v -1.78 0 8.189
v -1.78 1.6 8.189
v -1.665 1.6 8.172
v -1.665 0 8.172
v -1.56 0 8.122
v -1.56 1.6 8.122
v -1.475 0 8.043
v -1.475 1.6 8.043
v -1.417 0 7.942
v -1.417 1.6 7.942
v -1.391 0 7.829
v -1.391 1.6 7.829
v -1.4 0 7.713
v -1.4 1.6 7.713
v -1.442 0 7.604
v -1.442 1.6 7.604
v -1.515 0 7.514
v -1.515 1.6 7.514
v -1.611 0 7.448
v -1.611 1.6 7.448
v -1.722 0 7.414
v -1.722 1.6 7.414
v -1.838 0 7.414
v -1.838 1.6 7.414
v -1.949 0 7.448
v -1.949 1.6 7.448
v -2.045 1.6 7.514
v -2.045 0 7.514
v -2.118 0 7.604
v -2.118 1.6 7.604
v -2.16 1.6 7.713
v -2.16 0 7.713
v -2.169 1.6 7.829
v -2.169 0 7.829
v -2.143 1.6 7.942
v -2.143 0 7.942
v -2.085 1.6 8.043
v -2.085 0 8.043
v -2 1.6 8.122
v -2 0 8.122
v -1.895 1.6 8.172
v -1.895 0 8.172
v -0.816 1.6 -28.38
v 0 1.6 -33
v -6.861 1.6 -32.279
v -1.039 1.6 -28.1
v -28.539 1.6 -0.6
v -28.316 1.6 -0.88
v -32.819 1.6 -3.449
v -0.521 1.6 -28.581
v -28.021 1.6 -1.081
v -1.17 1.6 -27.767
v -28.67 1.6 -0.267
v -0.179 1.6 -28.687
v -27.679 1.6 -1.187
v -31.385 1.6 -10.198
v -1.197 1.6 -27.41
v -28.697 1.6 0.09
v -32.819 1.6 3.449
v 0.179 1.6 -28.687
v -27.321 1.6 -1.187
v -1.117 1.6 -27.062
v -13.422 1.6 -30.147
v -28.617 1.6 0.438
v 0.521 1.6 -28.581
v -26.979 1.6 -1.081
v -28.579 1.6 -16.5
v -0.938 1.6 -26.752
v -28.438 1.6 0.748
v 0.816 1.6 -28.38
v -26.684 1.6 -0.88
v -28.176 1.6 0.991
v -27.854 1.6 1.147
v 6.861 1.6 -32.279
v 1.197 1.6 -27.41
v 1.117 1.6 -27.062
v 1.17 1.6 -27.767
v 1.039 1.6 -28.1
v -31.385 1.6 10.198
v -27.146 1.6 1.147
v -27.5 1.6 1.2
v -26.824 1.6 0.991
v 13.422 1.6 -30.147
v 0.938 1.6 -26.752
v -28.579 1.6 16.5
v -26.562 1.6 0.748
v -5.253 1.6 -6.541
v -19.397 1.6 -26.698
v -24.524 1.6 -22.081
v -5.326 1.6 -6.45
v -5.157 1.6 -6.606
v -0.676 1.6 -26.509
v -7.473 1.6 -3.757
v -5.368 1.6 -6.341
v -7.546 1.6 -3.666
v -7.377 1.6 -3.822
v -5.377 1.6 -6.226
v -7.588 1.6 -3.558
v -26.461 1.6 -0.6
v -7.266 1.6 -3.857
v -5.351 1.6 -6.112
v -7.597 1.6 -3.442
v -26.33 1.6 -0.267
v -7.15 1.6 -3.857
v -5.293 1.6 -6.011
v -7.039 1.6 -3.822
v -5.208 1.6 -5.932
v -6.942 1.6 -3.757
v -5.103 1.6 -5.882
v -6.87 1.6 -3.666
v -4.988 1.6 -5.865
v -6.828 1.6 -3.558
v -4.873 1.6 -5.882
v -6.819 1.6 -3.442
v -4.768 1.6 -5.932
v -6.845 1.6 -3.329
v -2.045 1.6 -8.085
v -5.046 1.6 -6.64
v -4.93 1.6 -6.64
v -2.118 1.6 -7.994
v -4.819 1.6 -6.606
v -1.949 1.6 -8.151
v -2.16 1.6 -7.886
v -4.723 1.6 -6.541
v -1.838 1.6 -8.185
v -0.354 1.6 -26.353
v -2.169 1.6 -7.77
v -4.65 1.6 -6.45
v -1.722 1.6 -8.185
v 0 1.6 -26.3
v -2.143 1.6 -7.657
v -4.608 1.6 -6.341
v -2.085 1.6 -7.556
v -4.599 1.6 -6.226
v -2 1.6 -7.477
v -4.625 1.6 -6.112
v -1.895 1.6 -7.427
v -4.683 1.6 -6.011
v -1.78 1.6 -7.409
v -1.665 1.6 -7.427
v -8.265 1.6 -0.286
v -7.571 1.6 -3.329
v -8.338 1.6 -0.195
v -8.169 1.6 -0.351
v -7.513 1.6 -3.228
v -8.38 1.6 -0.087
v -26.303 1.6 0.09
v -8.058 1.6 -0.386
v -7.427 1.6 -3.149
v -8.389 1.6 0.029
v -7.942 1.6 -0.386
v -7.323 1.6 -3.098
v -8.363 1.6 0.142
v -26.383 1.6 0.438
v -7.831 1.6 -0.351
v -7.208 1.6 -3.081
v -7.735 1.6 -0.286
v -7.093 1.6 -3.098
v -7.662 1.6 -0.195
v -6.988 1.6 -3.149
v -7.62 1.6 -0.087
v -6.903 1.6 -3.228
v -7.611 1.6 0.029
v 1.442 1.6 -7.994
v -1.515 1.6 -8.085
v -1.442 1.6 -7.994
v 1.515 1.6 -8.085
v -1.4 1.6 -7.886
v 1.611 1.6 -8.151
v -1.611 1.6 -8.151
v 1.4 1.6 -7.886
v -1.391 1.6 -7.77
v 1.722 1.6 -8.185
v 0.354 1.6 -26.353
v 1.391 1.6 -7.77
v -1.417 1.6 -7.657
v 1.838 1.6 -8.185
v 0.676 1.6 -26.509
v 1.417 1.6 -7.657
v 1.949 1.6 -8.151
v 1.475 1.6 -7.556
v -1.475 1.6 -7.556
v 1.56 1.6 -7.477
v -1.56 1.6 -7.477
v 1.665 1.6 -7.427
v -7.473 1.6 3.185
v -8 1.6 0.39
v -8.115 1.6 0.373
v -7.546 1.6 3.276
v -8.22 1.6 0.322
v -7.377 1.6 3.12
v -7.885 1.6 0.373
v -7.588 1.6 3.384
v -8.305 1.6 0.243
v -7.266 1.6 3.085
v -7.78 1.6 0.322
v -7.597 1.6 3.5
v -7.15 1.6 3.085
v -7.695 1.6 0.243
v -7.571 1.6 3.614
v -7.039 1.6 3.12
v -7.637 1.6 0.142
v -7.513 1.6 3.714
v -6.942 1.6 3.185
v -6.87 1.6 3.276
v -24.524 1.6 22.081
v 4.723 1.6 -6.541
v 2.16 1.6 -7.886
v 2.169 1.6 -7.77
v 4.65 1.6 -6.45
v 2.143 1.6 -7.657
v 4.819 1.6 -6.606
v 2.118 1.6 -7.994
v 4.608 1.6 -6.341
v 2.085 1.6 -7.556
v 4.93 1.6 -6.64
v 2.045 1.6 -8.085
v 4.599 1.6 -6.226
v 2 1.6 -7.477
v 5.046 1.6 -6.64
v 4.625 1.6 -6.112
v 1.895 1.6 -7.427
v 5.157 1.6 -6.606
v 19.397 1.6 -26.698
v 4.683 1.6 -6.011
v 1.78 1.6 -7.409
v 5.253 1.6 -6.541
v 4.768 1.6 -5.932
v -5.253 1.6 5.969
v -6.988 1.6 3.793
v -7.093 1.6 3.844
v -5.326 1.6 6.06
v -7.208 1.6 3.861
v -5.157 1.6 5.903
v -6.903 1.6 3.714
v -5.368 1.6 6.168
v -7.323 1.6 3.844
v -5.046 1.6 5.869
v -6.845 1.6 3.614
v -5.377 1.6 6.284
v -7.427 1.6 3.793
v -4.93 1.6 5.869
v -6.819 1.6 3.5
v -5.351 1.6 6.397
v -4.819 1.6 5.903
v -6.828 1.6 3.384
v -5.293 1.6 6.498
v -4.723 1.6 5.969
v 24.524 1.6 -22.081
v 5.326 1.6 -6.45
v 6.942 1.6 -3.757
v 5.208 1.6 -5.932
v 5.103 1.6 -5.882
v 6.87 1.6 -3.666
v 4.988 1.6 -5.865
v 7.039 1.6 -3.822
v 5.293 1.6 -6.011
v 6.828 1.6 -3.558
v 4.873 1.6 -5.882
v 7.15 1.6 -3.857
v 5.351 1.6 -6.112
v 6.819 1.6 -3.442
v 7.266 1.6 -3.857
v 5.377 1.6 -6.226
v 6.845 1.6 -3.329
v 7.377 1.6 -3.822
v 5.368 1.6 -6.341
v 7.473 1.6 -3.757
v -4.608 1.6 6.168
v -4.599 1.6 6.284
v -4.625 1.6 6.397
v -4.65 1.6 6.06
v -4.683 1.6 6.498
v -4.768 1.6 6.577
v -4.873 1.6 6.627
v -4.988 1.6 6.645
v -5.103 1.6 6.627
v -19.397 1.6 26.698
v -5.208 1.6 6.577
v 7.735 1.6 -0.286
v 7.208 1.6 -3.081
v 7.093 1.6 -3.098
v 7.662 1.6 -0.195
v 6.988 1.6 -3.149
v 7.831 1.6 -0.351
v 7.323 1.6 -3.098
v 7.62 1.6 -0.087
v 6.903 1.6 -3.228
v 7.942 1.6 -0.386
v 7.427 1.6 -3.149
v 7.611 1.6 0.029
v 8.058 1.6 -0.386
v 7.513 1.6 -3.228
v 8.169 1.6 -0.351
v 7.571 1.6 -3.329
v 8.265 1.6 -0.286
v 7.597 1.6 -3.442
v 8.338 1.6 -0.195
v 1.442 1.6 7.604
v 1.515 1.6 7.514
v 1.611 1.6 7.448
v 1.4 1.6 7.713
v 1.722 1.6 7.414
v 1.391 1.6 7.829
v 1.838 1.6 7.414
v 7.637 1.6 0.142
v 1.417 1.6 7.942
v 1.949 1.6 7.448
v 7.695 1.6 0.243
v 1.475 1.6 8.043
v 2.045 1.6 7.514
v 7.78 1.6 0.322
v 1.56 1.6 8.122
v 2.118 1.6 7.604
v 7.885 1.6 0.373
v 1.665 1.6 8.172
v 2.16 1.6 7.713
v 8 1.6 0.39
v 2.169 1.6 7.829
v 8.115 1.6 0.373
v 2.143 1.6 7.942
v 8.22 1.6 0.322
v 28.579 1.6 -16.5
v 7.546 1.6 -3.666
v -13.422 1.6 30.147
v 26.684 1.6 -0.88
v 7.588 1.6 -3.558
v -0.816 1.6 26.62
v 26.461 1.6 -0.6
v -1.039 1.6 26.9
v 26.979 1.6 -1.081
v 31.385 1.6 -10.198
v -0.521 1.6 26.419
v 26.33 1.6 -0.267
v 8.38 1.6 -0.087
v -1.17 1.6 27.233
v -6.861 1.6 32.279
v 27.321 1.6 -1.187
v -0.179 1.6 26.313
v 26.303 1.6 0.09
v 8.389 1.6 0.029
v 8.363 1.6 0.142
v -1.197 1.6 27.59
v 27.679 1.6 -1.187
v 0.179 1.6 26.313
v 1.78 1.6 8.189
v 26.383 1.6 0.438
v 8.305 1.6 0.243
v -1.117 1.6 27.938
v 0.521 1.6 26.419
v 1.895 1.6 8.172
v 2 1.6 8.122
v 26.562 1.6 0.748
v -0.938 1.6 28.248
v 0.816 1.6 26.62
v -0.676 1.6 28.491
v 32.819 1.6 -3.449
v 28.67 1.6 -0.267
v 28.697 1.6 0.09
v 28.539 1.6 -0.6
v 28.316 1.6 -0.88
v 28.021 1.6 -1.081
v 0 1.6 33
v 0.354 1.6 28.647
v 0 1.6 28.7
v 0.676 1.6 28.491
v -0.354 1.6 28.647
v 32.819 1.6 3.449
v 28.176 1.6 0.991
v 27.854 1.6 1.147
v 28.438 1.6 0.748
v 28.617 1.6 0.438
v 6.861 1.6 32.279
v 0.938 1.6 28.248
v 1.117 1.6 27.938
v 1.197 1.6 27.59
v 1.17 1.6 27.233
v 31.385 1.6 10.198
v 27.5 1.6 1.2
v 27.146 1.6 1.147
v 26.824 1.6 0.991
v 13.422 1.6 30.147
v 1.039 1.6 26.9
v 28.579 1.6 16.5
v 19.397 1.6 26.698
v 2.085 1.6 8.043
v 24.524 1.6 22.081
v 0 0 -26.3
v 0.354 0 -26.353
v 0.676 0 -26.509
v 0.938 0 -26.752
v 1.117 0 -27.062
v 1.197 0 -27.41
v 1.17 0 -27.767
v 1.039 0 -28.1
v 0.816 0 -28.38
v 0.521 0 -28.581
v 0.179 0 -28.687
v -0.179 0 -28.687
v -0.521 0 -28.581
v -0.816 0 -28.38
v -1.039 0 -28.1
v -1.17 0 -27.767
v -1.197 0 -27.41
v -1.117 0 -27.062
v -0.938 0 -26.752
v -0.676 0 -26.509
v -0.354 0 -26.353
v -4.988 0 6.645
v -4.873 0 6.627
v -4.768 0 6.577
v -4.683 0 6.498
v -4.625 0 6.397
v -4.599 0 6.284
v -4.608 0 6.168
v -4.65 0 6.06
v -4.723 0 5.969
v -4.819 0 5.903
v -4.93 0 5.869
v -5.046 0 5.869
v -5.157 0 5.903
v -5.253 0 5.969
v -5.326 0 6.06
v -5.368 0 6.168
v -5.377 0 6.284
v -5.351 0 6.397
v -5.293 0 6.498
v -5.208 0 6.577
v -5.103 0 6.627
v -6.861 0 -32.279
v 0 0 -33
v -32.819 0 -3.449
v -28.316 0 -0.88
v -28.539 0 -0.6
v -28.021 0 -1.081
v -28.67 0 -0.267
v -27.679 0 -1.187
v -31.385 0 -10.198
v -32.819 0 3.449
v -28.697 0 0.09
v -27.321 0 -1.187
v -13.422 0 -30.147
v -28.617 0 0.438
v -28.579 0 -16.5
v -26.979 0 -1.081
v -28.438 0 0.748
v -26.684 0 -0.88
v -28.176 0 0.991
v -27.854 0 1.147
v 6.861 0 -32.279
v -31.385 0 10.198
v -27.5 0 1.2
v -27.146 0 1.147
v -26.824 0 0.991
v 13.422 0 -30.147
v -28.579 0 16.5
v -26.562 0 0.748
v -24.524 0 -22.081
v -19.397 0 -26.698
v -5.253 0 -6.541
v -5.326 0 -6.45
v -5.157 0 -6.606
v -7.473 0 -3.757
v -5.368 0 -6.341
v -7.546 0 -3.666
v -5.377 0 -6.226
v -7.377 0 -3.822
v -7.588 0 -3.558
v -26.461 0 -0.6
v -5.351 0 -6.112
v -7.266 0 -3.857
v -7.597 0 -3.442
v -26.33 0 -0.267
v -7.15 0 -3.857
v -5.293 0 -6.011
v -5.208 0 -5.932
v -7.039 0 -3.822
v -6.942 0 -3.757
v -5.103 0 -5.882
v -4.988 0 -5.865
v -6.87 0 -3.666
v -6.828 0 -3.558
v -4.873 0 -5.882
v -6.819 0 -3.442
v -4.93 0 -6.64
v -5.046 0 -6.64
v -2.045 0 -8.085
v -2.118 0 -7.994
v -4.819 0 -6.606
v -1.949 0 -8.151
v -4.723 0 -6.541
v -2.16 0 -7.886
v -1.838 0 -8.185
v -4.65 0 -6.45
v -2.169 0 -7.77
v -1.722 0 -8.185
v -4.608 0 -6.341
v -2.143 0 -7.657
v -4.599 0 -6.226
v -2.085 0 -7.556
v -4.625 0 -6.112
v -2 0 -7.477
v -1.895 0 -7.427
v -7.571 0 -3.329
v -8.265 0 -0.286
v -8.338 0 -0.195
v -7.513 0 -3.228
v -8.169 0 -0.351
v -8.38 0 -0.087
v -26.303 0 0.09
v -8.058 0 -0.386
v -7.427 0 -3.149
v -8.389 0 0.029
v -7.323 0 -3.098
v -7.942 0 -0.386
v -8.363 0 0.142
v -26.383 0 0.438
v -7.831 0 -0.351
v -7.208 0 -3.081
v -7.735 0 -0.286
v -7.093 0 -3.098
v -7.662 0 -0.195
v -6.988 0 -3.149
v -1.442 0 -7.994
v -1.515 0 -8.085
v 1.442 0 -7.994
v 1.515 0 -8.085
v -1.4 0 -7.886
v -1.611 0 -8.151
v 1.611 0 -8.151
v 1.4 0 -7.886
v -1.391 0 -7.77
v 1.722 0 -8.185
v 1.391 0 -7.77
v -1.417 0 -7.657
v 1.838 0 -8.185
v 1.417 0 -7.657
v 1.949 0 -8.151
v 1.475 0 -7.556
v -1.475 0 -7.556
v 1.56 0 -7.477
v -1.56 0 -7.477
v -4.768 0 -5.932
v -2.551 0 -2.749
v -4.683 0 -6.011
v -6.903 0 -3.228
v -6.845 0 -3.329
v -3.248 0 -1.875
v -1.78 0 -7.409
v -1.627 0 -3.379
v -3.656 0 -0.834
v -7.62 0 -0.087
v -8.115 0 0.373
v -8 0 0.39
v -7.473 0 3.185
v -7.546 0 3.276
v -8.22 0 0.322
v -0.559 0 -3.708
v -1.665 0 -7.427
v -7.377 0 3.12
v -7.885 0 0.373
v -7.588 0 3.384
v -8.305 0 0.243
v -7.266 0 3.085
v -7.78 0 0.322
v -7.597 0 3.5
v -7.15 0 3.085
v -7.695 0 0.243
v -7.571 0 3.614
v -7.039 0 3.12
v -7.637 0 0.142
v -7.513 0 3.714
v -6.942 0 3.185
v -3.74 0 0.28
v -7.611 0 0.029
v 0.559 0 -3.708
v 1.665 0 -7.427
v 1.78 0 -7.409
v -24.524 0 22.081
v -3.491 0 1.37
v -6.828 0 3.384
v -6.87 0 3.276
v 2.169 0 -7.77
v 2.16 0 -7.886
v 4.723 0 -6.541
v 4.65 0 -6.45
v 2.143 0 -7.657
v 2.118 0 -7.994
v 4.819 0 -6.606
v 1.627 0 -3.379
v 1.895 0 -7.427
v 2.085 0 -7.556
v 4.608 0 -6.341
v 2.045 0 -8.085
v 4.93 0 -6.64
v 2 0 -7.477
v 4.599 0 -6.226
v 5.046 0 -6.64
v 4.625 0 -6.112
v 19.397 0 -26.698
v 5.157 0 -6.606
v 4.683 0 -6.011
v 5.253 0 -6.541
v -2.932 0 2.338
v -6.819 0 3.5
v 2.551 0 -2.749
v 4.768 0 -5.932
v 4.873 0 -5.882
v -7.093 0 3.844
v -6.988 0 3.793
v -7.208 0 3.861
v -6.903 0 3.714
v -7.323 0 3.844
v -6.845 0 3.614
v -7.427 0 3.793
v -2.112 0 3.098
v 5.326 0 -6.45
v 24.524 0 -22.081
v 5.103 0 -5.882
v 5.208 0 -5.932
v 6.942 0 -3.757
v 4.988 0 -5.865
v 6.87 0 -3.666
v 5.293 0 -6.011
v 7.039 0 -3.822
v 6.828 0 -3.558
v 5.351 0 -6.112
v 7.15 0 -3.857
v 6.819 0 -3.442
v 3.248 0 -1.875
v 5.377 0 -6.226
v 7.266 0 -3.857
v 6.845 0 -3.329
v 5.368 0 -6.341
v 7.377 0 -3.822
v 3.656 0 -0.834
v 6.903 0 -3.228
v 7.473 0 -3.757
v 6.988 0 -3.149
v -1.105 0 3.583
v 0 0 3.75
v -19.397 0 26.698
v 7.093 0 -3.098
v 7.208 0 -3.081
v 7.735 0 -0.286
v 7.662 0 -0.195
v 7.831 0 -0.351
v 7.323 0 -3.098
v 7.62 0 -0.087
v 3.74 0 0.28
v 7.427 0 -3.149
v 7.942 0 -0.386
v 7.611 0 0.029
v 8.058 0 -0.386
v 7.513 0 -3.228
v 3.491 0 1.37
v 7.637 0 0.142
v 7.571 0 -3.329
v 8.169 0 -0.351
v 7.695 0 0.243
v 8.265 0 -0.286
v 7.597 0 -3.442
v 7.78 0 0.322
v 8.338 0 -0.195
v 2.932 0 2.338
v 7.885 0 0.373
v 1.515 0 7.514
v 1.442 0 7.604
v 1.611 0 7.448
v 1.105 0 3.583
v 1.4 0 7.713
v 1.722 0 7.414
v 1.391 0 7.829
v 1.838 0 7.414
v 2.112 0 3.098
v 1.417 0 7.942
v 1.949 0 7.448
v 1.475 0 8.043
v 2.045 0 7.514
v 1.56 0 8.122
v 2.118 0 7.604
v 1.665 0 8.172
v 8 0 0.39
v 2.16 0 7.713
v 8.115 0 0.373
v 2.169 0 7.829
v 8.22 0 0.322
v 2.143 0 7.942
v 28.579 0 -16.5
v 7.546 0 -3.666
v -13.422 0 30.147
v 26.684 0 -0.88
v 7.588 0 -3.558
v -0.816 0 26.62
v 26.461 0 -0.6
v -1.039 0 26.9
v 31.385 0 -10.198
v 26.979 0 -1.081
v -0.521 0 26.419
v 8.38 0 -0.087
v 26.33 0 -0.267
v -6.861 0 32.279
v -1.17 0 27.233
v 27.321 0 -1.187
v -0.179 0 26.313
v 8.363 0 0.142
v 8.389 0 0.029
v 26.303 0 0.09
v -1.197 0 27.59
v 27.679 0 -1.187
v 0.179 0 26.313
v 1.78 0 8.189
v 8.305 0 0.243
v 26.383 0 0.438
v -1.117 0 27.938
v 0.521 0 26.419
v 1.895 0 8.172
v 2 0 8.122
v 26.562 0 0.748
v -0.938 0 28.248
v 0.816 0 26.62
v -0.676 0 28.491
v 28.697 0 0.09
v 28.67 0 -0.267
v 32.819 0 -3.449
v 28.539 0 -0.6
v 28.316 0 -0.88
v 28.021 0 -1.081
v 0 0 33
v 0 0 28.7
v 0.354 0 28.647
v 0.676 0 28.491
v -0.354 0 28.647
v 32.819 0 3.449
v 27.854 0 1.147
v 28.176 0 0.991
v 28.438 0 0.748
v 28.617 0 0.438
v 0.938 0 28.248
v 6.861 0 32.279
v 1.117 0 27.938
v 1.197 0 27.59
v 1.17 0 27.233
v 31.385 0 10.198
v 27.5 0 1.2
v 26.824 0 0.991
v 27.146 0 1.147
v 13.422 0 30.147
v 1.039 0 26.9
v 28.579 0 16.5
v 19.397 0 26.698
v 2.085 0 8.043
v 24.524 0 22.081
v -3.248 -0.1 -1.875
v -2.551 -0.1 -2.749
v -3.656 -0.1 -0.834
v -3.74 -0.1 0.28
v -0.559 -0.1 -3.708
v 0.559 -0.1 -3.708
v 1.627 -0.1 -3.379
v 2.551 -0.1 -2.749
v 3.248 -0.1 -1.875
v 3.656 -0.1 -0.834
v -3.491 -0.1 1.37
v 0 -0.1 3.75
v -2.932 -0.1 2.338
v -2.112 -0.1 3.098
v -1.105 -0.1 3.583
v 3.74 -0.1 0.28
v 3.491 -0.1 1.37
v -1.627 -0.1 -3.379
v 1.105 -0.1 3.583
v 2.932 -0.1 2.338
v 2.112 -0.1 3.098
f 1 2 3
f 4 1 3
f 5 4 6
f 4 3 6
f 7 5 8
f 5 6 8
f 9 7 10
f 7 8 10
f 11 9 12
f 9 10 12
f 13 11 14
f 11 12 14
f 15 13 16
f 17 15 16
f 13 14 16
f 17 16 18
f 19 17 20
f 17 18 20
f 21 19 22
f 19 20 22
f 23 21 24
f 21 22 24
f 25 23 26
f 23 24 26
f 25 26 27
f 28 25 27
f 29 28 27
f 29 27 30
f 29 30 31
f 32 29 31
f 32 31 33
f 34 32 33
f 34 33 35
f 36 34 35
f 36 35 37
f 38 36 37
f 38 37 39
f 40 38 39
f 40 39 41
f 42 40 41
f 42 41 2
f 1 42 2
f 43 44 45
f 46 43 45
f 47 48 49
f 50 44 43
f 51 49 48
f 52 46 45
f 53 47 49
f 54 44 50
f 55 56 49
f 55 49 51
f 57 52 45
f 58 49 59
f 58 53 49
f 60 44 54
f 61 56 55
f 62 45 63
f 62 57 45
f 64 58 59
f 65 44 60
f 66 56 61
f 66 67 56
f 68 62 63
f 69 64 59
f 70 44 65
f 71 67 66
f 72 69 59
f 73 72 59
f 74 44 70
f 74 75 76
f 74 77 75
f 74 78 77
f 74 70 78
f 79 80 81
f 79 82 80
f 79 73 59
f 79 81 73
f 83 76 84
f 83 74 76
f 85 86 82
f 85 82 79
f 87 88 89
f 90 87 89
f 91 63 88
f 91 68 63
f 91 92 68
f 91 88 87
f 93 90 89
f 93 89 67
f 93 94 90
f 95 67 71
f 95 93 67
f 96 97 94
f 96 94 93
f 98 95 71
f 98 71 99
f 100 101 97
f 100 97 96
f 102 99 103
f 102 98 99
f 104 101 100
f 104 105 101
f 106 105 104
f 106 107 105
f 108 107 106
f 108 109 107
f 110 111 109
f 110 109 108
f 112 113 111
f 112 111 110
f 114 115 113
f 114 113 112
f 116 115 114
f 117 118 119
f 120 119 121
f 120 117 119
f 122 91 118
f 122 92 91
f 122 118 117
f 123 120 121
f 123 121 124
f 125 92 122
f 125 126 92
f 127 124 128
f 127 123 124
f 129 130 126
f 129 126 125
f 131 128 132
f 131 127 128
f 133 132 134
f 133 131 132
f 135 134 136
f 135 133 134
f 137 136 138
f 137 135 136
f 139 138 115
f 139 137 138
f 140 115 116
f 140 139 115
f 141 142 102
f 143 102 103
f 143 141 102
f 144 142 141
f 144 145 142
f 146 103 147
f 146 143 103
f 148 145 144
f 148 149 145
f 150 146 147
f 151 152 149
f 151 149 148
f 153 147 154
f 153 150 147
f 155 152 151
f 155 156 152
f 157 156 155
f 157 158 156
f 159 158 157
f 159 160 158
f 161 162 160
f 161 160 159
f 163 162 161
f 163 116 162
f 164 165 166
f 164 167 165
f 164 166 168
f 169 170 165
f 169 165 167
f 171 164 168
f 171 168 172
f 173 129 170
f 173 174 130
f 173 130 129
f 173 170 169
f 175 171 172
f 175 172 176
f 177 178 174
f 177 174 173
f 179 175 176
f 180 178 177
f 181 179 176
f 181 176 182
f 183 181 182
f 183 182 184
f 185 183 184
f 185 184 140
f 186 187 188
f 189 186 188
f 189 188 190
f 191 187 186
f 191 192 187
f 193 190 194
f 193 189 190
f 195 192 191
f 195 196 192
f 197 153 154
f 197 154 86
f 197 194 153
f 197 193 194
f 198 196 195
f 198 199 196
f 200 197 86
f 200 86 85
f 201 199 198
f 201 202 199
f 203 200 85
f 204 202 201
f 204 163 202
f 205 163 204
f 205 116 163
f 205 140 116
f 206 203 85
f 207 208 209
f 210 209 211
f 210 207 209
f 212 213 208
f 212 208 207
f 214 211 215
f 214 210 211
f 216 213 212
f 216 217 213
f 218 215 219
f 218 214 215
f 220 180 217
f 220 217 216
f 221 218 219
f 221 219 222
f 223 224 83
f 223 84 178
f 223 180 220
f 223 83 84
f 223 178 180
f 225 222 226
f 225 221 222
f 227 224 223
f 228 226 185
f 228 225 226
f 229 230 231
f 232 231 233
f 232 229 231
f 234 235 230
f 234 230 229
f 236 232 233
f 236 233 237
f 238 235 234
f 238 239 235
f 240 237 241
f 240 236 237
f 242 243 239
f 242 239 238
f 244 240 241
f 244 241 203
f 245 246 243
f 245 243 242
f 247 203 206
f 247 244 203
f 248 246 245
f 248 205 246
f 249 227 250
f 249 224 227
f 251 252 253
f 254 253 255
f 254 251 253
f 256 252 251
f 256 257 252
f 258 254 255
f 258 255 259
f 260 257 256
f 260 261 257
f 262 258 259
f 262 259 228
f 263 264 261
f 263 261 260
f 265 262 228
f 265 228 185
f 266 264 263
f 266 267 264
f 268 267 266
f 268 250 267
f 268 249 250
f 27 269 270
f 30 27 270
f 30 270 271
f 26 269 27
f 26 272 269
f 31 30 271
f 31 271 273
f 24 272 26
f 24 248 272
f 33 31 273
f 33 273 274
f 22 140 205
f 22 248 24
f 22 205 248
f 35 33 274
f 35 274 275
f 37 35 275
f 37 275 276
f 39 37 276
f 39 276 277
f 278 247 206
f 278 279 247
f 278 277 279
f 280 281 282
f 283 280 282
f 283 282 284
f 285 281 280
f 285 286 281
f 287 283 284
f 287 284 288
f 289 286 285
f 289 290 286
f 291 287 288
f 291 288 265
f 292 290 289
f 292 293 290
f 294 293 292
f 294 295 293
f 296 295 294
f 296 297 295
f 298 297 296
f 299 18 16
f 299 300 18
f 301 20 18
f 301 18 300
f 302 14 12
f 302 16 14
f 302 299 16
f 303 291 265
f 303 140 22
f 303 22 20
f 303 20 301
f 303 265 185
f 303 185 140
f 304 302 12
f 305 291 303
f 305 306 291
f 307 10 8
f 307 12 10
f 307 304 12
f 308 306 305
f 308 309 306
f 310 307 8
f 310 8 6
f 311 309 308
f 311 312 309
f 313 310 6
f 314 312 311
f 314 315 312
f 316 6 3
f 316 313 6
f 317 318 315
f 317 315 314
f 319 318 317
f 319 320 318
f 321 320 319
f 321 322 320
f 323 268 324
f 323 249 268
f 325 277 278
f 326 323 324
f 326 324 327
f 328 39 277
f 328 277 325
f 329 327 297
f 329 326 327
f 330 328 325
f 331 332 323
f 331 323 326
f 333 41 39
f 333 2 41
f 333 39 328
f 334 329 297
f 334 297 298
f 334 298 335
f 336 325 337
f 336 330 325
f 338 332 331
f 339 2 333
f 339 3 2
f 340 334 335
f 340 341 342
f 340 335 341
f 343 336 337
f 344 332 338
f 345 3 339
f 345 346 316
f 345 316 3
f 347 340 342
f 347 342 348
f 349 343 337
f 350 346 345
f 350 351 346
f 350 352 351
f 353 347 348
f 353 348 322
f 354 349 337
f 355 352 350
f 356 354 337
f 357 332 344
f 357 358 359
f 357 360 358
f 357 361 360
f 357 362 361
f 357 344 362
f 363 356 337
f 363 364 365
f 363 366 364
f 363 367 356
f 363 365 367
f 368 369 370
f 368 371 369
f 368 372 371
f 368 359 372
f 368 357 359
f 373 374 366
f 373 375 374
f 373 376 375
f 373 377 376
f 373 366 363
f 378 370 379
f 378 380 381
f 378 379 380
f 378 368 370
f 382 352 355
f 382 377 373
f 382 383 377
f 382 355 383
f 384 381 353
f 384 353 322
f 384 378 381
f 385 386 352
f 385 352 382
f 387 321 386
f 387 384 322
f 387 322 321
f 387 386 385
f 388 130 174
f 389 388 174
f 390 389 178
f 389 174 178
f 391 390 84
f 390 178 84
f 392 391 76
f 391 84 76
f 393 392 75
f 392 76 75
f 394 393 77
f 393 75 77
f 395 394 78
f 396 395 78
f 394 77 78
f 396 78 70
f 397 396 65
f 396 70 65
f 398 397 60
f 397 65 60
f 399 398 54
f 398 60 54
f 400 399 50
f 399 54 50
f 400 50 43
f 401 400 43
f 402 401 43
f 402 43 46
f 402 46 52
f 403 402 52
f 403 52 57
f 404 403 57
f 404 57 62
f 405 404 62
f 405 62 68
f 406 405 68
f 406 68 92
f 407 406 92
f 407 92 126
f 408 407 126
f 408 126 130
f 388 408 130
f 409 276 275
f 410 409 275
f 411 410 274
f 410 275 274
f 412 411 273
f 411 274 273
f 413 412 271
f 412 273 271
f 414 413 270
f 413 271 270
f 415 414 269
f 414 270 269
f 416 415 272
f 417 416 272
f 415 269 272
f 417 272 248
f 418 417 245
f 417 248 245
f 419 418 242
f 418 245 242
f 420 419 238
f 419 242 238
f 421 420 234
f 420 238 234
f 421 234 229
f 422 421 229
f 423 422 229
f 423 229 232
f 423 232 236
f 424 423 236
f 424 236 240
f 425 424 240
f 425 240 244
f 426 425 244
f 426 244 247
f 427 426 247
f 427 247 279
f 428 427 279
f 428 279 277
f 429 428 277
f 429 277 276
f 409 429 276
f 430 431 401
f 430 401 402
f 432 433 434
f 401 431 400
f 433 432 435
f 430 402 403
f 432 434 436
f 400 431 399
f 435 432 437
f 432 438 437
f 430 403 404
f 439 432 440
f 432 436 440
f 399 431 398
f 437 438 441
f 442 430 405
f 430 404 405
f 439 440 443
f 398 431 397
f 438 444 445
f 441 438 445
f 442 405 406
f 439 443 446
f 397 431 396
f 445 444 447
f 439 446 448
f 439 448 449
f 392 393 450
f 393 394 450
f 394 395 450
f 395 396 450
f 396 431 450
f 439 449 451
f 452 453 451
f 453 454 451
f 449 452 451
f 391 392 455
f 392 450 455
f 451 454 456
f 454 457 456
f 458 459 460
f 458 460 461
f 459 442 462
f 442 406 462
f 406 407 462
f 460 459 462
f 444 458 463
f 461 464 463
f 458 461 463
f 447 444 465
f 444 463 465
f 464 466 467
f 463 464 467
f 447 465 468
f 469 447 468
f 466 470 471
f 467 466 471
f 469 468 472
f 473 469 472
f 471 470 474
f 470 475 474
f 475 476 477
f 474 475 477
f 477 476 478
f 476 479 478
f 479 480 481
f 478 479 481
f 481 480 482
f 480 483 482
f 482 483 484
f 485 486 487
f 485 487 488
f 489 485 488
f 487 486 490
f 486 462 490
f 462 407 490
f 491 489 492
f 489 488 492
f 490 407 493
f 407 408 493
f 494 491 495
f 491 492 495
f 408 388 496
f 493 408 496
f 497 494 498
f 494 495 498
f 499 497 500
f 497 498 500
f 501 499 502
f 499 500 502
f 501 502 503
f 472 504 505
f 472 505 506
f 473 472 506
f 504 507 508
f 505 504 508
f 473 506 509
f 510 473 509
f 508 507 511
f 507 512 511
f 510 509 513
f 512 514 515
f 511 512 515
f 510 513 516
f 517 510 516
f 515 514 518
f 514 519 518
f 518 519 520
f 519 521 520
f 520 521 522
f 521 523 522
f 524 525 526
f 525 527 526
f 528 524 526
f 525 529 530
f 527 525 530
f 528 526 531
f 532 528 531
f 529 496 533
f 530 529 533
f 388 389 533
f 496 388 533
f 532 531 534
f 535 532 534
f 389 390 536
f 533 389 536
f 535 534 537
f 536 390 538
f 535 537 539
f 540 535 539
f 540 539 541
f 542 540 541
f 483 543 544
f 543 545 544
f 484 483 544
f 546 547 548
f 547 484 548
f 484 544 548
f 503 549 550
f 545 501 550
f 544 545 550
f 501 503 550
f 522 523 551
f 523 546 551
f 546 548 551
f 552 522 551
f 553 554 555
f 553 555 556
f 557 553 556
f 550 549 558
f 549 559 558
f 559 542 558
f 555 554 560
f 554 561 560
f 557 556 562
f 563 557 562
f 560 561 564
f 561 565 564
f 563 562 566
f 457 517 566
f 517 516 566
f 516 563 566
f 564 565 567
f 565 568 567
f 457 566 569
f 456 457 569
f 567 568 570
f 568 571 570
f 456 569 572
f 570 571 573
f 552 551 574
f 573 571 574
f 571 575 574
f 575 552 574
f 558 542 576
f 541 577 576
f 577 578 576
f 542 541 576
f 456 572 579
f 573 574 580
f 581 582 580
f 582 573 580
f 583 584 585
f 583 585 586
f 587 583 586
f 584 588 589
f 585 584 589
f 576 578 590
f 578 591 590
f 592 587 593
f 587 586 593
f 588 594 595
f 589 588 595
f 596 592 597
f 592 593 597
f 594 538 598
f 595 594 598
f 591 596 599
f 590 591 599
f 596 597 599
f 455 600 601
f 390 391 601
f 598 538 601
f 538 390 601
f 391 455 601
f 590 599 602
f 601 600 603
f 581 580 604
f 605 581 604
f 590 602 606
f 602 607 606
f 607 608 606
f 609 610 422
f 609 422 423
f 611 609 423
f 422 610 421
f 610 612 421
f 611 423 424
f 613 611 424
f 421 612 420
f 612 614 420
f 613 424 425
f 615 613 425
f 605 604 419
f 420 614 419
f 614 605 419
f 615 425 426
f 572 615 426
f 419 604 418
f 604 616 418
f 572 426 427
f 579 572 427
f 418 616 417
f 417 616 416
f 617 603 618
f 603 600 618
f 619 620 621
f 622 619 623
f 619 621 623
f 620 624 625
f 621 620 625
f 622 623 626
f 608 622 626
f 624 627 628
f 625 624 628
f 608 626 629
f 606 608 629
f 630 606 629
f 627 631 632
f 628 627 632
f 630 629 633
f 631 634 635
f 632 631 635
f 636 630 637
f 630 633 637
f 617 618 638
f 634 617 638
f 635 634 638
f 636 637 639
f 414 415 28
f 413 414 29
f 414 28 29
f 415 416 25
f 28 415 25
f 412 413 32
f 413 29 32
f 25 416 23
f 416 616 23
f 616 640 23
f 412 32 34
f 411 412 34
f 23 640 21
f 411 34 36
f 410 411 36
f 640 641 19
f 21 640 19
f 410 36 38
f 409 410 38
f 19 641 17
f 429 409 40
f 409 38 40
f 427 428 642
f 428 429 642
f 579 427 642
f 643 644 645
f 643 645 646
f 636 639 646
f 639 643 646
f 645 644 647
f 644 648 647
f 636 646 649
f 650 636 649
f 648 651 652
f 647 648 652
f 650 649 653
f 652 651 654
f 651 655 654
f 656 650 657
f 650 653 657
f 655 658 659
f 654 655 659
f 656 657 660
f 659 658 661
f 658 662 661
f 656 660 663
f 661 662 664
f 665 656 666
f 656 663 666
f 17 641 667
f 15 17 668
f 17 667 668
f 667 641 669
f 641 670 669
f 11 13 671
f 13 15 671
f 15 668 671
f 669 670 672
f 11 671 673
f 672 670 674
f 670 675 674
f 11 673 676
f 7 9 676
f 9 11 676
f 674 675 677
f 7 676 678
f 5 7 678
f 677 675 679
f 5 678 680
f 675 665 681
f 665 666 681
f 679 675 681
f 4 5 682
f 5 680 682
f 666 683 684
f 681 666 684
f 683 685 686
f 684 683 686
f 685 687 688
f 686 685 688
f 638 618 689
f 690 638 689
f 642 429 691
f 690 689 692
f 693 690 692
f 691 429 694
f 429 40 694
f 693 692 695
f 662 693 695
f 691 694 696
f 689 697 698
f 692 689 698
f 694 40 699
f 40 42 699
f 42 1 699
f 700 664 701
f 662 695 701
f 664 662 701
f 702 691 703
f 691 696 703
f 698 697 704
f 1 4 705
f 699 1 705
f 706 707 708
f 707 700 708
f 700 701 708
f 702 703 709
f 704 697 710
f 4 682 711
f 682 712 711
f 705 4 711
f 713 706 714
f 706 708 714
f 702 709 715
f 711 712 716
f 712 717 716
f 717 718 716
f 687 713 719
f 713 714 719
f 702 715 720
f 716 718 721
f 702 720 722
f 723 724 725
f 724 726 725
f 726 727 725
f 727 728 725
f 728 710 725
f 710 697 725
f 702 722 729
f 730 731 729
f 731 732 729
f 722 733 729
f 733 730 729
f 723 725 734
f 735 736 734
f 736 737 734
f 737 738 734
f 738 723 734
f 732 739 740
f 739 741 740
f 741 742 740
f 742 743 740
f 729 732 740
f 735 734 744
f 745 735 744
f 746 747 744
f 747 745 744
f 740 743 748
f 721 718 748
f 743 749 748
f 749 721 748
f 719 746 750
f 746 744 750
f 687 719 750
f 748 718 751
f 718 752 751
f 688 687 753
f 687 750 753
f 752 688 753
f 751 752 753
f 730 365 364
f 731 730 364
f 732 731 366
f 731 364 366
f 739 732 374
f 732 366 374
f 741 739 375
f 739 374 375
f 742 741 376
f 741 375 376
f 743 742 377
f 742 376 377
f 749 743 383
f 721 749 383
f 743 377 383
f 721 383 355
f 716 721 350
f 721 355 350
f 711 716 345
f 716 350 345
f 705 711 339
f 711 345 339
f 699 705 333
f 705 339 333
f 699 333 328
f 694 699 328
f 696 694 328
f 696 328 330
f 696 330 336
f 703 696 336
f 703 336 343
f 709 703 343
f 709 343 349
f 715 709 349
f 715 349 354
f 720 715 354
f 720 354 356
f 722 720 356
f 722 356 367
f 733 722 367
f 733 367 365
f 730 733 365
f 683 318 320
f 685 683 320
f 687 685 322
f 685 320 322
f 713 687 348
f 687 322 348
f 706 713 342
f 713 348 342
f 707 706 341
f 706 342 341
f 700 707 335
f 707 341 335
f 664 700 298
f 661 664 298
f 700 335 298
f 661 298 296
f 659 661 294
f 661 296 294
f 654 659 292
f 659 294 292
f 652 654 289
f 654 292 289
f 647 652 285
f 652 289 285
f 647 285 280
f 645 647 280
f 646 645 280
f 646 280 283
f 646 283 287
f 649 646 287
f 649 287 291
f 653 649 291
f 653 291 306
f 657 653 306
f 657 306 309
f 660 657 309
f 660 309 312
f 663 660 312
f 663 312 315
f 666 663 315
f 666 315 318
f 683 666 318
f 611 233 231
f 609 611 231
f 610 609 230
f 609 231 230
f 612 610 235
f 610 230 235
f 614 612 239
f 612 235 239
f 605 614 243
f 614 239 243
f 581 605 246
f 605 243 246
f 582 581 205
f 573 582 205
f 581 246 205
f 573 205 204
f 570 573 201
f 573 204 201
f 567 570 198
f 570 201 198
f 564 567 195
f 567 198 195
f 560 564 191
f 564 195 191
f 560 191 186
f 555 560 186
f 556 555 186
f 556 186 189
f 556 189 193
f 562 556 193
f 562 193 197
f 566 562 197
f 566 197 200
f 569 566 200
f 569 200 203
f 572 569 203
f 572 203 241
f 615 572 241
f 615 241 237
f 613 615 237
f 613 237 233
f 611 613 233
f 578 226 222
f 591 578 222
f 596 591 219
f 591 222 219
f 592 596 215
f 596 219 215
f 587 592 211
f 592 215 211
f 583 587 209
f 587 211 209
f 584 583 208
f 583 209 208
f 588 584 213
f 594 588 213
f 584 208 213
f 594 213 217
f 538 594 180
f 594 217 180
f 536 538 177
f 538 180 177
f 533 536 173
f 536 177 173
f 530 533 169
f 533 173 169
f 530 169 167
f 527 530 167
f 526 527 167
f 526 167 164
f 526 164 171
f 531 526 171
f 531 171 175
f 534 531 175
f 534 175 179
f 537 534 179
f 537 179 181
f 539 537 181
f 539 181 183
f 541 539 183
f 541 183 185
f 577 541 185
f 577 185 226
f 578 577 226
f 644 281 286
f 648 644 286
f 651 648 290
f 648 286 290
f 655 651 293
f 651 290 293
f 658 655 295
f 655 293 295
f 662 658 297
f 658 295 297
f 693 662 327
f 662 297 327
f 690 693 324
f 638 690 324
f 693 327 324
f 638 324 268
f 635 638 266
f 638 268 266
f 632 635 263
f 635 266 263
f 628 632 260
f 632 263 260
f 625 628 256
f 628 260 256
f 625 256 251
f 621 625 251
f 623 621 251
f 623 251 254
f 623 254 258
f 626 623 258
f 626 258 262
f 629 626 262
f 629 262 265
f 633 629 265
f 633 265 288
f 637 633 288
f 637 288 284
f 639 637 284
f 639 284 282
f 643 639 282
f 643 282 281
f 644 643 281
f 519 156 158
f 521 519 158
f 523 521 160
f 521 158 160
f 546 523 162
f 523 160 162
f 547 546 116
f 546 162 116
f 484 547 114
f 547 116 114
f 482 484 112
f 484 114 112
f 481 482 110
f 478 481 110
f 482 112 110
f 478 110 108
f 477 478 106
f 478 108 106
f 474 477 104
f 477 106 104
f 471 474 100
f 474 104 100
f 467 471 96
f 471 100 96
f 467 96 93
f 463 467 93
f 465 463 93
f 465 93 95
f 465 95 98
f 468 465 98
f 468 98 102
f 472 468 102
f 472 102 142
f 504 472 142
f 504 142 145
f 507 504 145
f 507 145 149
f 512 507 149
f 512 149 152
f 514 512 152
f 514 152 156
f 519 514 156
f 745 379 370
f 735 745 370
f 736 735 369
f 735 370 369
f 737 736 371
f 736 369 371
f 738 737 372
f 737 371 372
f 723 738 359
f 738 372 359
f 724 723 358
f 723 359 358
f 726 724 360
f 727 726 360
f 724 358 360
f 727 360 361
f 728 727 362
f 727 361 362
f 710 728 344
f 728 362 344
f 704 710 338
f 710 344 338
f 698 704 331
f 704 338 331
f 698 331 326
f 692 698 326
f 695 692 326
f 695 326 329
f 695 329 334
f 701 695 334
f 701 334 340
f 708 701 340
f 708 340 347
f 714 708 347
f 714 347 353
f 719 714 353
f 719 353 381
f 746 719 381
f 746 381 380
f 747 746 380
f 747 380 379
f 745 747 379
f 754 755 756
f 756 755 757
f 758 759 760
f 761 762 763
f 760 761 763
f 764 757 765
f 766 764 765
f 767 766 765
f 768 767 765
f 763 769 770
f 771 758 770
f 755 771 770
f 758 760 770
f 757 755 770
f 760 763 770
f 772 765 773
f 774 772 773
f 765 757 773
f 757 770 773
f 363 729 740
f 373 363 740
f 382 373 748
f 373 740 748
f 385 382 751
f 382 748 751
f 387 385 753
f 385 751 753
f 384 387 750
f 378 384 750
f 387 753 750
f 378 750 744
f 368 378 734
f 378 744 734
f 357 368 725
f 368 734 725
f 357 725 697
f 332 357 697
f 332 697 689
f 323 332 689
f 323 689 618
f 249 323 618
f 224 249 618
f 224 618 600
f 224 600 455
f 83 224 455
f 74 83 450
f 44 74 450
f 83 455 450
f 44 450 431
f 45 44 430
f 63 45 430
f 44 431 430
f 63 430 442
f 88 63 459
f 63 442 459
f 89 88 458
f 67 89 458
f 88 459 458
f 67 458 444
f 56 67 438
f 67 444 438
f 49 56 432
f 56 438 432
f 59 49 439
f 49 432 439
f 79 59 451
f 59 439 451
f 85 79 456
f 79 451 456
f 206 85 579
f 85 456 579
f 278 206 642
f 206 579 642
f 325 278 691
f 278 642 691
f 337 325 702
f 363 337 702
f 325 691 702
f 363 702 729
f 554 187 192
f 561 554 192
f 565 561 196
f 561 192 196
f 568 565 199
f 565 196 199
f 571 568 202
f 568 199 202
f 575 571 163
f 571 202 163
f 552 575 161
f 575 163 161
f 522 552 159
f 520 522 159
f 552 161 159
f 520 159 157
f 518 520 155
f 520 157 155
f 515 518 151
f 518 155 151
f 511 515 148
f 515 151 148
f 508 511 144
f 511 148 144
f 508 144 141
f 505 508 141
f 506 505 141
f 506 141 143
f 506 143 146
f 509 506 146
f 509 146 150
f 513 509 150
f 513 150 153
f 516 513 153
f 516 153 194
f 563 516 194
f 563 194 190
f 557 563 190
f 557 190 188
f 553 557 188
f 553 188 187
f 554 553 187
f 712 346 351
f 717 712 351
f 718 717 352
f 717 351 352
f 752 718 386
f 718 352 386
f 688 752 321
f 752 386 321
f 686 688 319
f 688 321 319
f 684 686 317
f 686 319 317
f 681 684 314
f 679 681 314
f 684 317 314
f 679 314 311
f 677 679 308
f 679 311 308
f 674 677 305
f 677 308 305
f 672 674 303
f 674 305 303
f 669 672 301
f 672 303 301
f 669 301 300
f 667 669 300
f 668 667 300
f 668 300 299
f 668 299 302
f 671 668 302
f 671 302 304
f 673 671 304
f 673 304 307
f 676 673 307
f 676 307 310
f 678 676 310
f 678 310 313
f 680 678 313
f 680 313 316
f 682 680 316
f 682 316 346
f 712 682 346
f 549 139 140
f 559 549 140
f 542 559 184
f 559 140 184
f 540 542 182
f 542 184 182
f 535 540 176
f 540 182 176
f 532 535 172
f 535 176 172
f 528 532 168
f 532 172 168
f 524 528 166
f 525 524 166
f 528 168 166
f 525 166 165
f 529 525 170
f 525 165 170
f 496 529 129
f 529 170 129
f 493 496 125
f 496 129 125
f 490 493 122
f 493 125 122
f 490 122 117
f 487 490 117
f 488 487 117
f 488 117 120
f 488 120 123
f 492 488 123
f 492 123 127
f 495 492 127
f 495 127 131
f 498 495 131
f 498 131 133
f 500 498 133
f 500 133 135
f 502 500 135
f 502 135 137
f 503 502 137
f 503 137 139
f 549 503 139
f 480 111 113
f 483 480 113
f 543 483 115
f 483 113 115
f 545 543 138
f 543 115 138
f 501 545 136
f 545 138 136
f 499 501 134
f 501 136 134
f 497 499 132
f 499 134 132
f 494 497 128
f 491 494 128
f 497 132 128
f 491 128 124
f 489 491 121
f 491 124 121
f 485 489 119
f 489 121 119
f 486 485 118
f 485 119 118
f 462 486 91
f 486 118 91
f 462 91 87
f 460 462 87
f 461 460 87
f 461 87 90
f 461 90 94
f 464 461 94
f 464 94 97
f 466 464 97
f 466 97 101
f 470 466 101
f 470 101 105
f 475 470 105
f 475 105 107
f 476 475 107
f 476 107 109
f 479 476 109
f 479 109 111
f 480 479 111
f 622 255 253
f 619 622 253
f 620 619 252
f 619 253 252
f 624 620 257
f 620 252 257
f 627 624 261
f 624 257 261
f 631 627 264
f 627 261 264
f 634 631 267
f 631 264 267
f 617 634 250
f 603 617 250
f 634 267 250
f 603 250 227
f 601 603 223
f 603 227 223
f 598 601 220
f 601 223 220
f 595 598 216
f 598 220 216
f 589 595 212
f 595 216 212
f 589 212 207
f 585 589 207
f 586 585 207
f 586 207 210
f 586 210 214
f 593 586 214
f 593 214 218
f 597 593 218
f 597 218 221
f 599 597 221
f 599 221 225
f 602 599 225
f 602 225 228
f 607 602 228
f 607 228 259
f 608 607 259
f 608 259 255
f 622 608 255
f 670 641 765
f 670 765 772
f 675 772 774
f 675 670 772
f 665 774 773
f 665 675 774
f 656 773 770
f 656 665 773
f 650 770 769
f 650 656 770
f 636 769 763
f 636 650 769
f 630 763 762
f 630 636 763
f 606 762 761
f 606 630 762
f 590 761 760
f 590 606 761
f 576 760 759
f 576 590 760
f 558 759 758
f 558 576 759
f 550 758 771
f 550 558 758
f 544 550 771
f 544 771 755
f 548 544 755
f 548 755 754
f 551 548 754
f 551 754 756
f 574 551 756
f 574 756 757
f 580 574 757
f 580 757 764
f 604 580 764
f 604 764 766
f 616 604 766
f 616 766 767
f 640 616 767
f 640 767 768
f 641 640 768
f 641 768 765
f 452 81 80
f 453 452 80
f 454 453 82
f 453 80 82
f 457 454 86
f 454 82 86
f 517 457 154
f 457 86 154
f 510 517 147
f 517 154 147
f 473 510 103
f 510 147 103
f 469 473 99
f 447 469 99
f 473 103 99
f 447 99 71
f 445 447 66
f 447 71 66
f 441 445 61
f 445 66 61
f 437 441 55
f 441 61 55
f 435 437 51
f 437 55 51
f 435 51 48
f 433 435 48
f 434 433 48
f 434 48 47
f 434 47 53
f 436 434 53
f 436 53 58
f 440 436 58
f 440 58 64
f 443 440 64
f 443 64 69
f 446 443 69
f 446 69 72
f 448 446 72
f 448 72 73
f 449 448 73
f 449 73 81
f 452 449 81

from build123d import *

# Parameters (mm, degrees)
SKETCH1_R           = 33
BOSS_EXTRUDE1_DEPTH = 1.6
SKETCH2_R           = 1.2
CUT_EXTRUDE1_DEPTH  = 3
SKETCH3_R           = 3.75
CUT_EXTRUDE2_DEPTH  = 3
SKETCH5_R           = 0.39
CUT_EXTRUDE4_DEPTH  = 10
SKETCH6_R           = 3.75
BOSS_EXTRUDE2_DEPTH = 1.7


with BuildPart() as part:
    # Sketch1 → Boss-Extrude1 (new body)
    with BuildSketch(Plane(origin=(0, 0, 0), x_dir=(1, 0, 0), z_dir=(0, 1, 0))):
        with Locations(Location((0, 0, 0), (0, 0, 270))):
            Circle(SKETCH1_R)
    extrude(amount=BOSS_EXTRUDE1_DEPTH)

    # Sketch2 → Cut-Extrude1 (cut)
    with BuildSketch(Plane(origin=(0, 1.6, 0), x_dir=(1, 0, 0), z_dir=(0, 1, 0))):
        with Locations(Location((0, 27.5, 0), (0, 0, 270))):
            Circle(SKETCH2_R)
        with Locations(Location((27.5, 0, 0), (0, 0, 270))):
            Circle(SKETCH2_R)
        with Locations(Location((0, -27.5, 0), (0, 0, 270))):
            Circle(SKETCH2_R)
        with Locations(Location((-27.5, 0, 0), (0, 0, 270))):
            Circle(SKETCH2_R)
    extrude(amount=-CUT_EXTRUDE1_DEPTH, mode=Mode.SUBTRACT)

    # Sketch3 → Cut-Extrude2 (cut)
    with BuildSketch(Plane(origin=(0, 1.6, 0), x_dir=(1, 0, 0), z_dir=(0, 1, 0))):
        with Locations(Location((0, 0, 0), (0, 0, 270))):
            Circle(SKETCH3_R)
    extrude(amount=-CUT_EXTRUDE2_DEPTH, mode=Mode.SUBTRACT)

    # Sketch5 → Cut-Extrude4 (cut)
    with BuildSketch(Plane(origin=(0, 1.6, 0), x_dir=(1, 0, 0), z_dir=(0, 1, 0))):
        with Locations(Location((-1.780167472, 7.799423297, 0), (0, 0, 270))):
            Circle(SKETCH5_R)
        with Locations(Location((1.780167472, 7.799423297, 0), (0, 0, 270))):
            Circle(SKETCH5_R)
        with Locations(Location((4.987918415, 6.25465186, 0), (0, 0, 270))):
            Circle(SKETCH5_R)
        with Locations(Location((7.207750943, 3.471069913, 0), (0, 0, 270))):
            Circle(SKETCH5_R)
        with Locations(Location((8, 0, 0), (0, 0, 270))):
            Circle(SKETCH5_R)
        with Locations(Location((1.780167472, -7.799423297, 0), (0, 0, 270))):
            Circle(SKETCH5_R)
        with Locations(Location((-1.780167472, -7.799423297, 0), (0, 0, 270))):
            Circle(SKETCH5_R)
        with Locations(Location((-4.987918415, -6.25465186, 0), (0, 0, 270))):
            Circle(SKETCH5_R)
        with Locations(Location((-7.207750943, -3.471069913, 0), (0, 0, 270))):
            Circle(SKETCH5_R)
        with Locations(Location((-8, 0, 0), (0, 0, 270))):
            Circle(SKETCH5_R)
        with Locations(Location((-7.207750943, 3.471069913, 0), (0, 0, 270))):
            Circle(SKETCH5_R)
        with Locations(Location((-4.987918415, 6.25465186, 0), (0, 0, 270))):
            Circle(SKETCH5_R)
    extrude(amount=-CUT_EXTRUDE4_DEPTH, mode=Mode.SUBTRACT)

    # Sketch6 → Boss-Extrude2 (add)
    with BuildSketch(Plane(origin=(0, 1.6, 0), x_dir=(1, 0, 0), z_dir=(0, 1, 0))):
        with Locations(Location((0, 0, 0), (0, 0, 270))):
            Circle(SKETCH6_R)
    extrude(amount=-BOSS_EXTRUDE2_DEPTH)


solid = part.part
